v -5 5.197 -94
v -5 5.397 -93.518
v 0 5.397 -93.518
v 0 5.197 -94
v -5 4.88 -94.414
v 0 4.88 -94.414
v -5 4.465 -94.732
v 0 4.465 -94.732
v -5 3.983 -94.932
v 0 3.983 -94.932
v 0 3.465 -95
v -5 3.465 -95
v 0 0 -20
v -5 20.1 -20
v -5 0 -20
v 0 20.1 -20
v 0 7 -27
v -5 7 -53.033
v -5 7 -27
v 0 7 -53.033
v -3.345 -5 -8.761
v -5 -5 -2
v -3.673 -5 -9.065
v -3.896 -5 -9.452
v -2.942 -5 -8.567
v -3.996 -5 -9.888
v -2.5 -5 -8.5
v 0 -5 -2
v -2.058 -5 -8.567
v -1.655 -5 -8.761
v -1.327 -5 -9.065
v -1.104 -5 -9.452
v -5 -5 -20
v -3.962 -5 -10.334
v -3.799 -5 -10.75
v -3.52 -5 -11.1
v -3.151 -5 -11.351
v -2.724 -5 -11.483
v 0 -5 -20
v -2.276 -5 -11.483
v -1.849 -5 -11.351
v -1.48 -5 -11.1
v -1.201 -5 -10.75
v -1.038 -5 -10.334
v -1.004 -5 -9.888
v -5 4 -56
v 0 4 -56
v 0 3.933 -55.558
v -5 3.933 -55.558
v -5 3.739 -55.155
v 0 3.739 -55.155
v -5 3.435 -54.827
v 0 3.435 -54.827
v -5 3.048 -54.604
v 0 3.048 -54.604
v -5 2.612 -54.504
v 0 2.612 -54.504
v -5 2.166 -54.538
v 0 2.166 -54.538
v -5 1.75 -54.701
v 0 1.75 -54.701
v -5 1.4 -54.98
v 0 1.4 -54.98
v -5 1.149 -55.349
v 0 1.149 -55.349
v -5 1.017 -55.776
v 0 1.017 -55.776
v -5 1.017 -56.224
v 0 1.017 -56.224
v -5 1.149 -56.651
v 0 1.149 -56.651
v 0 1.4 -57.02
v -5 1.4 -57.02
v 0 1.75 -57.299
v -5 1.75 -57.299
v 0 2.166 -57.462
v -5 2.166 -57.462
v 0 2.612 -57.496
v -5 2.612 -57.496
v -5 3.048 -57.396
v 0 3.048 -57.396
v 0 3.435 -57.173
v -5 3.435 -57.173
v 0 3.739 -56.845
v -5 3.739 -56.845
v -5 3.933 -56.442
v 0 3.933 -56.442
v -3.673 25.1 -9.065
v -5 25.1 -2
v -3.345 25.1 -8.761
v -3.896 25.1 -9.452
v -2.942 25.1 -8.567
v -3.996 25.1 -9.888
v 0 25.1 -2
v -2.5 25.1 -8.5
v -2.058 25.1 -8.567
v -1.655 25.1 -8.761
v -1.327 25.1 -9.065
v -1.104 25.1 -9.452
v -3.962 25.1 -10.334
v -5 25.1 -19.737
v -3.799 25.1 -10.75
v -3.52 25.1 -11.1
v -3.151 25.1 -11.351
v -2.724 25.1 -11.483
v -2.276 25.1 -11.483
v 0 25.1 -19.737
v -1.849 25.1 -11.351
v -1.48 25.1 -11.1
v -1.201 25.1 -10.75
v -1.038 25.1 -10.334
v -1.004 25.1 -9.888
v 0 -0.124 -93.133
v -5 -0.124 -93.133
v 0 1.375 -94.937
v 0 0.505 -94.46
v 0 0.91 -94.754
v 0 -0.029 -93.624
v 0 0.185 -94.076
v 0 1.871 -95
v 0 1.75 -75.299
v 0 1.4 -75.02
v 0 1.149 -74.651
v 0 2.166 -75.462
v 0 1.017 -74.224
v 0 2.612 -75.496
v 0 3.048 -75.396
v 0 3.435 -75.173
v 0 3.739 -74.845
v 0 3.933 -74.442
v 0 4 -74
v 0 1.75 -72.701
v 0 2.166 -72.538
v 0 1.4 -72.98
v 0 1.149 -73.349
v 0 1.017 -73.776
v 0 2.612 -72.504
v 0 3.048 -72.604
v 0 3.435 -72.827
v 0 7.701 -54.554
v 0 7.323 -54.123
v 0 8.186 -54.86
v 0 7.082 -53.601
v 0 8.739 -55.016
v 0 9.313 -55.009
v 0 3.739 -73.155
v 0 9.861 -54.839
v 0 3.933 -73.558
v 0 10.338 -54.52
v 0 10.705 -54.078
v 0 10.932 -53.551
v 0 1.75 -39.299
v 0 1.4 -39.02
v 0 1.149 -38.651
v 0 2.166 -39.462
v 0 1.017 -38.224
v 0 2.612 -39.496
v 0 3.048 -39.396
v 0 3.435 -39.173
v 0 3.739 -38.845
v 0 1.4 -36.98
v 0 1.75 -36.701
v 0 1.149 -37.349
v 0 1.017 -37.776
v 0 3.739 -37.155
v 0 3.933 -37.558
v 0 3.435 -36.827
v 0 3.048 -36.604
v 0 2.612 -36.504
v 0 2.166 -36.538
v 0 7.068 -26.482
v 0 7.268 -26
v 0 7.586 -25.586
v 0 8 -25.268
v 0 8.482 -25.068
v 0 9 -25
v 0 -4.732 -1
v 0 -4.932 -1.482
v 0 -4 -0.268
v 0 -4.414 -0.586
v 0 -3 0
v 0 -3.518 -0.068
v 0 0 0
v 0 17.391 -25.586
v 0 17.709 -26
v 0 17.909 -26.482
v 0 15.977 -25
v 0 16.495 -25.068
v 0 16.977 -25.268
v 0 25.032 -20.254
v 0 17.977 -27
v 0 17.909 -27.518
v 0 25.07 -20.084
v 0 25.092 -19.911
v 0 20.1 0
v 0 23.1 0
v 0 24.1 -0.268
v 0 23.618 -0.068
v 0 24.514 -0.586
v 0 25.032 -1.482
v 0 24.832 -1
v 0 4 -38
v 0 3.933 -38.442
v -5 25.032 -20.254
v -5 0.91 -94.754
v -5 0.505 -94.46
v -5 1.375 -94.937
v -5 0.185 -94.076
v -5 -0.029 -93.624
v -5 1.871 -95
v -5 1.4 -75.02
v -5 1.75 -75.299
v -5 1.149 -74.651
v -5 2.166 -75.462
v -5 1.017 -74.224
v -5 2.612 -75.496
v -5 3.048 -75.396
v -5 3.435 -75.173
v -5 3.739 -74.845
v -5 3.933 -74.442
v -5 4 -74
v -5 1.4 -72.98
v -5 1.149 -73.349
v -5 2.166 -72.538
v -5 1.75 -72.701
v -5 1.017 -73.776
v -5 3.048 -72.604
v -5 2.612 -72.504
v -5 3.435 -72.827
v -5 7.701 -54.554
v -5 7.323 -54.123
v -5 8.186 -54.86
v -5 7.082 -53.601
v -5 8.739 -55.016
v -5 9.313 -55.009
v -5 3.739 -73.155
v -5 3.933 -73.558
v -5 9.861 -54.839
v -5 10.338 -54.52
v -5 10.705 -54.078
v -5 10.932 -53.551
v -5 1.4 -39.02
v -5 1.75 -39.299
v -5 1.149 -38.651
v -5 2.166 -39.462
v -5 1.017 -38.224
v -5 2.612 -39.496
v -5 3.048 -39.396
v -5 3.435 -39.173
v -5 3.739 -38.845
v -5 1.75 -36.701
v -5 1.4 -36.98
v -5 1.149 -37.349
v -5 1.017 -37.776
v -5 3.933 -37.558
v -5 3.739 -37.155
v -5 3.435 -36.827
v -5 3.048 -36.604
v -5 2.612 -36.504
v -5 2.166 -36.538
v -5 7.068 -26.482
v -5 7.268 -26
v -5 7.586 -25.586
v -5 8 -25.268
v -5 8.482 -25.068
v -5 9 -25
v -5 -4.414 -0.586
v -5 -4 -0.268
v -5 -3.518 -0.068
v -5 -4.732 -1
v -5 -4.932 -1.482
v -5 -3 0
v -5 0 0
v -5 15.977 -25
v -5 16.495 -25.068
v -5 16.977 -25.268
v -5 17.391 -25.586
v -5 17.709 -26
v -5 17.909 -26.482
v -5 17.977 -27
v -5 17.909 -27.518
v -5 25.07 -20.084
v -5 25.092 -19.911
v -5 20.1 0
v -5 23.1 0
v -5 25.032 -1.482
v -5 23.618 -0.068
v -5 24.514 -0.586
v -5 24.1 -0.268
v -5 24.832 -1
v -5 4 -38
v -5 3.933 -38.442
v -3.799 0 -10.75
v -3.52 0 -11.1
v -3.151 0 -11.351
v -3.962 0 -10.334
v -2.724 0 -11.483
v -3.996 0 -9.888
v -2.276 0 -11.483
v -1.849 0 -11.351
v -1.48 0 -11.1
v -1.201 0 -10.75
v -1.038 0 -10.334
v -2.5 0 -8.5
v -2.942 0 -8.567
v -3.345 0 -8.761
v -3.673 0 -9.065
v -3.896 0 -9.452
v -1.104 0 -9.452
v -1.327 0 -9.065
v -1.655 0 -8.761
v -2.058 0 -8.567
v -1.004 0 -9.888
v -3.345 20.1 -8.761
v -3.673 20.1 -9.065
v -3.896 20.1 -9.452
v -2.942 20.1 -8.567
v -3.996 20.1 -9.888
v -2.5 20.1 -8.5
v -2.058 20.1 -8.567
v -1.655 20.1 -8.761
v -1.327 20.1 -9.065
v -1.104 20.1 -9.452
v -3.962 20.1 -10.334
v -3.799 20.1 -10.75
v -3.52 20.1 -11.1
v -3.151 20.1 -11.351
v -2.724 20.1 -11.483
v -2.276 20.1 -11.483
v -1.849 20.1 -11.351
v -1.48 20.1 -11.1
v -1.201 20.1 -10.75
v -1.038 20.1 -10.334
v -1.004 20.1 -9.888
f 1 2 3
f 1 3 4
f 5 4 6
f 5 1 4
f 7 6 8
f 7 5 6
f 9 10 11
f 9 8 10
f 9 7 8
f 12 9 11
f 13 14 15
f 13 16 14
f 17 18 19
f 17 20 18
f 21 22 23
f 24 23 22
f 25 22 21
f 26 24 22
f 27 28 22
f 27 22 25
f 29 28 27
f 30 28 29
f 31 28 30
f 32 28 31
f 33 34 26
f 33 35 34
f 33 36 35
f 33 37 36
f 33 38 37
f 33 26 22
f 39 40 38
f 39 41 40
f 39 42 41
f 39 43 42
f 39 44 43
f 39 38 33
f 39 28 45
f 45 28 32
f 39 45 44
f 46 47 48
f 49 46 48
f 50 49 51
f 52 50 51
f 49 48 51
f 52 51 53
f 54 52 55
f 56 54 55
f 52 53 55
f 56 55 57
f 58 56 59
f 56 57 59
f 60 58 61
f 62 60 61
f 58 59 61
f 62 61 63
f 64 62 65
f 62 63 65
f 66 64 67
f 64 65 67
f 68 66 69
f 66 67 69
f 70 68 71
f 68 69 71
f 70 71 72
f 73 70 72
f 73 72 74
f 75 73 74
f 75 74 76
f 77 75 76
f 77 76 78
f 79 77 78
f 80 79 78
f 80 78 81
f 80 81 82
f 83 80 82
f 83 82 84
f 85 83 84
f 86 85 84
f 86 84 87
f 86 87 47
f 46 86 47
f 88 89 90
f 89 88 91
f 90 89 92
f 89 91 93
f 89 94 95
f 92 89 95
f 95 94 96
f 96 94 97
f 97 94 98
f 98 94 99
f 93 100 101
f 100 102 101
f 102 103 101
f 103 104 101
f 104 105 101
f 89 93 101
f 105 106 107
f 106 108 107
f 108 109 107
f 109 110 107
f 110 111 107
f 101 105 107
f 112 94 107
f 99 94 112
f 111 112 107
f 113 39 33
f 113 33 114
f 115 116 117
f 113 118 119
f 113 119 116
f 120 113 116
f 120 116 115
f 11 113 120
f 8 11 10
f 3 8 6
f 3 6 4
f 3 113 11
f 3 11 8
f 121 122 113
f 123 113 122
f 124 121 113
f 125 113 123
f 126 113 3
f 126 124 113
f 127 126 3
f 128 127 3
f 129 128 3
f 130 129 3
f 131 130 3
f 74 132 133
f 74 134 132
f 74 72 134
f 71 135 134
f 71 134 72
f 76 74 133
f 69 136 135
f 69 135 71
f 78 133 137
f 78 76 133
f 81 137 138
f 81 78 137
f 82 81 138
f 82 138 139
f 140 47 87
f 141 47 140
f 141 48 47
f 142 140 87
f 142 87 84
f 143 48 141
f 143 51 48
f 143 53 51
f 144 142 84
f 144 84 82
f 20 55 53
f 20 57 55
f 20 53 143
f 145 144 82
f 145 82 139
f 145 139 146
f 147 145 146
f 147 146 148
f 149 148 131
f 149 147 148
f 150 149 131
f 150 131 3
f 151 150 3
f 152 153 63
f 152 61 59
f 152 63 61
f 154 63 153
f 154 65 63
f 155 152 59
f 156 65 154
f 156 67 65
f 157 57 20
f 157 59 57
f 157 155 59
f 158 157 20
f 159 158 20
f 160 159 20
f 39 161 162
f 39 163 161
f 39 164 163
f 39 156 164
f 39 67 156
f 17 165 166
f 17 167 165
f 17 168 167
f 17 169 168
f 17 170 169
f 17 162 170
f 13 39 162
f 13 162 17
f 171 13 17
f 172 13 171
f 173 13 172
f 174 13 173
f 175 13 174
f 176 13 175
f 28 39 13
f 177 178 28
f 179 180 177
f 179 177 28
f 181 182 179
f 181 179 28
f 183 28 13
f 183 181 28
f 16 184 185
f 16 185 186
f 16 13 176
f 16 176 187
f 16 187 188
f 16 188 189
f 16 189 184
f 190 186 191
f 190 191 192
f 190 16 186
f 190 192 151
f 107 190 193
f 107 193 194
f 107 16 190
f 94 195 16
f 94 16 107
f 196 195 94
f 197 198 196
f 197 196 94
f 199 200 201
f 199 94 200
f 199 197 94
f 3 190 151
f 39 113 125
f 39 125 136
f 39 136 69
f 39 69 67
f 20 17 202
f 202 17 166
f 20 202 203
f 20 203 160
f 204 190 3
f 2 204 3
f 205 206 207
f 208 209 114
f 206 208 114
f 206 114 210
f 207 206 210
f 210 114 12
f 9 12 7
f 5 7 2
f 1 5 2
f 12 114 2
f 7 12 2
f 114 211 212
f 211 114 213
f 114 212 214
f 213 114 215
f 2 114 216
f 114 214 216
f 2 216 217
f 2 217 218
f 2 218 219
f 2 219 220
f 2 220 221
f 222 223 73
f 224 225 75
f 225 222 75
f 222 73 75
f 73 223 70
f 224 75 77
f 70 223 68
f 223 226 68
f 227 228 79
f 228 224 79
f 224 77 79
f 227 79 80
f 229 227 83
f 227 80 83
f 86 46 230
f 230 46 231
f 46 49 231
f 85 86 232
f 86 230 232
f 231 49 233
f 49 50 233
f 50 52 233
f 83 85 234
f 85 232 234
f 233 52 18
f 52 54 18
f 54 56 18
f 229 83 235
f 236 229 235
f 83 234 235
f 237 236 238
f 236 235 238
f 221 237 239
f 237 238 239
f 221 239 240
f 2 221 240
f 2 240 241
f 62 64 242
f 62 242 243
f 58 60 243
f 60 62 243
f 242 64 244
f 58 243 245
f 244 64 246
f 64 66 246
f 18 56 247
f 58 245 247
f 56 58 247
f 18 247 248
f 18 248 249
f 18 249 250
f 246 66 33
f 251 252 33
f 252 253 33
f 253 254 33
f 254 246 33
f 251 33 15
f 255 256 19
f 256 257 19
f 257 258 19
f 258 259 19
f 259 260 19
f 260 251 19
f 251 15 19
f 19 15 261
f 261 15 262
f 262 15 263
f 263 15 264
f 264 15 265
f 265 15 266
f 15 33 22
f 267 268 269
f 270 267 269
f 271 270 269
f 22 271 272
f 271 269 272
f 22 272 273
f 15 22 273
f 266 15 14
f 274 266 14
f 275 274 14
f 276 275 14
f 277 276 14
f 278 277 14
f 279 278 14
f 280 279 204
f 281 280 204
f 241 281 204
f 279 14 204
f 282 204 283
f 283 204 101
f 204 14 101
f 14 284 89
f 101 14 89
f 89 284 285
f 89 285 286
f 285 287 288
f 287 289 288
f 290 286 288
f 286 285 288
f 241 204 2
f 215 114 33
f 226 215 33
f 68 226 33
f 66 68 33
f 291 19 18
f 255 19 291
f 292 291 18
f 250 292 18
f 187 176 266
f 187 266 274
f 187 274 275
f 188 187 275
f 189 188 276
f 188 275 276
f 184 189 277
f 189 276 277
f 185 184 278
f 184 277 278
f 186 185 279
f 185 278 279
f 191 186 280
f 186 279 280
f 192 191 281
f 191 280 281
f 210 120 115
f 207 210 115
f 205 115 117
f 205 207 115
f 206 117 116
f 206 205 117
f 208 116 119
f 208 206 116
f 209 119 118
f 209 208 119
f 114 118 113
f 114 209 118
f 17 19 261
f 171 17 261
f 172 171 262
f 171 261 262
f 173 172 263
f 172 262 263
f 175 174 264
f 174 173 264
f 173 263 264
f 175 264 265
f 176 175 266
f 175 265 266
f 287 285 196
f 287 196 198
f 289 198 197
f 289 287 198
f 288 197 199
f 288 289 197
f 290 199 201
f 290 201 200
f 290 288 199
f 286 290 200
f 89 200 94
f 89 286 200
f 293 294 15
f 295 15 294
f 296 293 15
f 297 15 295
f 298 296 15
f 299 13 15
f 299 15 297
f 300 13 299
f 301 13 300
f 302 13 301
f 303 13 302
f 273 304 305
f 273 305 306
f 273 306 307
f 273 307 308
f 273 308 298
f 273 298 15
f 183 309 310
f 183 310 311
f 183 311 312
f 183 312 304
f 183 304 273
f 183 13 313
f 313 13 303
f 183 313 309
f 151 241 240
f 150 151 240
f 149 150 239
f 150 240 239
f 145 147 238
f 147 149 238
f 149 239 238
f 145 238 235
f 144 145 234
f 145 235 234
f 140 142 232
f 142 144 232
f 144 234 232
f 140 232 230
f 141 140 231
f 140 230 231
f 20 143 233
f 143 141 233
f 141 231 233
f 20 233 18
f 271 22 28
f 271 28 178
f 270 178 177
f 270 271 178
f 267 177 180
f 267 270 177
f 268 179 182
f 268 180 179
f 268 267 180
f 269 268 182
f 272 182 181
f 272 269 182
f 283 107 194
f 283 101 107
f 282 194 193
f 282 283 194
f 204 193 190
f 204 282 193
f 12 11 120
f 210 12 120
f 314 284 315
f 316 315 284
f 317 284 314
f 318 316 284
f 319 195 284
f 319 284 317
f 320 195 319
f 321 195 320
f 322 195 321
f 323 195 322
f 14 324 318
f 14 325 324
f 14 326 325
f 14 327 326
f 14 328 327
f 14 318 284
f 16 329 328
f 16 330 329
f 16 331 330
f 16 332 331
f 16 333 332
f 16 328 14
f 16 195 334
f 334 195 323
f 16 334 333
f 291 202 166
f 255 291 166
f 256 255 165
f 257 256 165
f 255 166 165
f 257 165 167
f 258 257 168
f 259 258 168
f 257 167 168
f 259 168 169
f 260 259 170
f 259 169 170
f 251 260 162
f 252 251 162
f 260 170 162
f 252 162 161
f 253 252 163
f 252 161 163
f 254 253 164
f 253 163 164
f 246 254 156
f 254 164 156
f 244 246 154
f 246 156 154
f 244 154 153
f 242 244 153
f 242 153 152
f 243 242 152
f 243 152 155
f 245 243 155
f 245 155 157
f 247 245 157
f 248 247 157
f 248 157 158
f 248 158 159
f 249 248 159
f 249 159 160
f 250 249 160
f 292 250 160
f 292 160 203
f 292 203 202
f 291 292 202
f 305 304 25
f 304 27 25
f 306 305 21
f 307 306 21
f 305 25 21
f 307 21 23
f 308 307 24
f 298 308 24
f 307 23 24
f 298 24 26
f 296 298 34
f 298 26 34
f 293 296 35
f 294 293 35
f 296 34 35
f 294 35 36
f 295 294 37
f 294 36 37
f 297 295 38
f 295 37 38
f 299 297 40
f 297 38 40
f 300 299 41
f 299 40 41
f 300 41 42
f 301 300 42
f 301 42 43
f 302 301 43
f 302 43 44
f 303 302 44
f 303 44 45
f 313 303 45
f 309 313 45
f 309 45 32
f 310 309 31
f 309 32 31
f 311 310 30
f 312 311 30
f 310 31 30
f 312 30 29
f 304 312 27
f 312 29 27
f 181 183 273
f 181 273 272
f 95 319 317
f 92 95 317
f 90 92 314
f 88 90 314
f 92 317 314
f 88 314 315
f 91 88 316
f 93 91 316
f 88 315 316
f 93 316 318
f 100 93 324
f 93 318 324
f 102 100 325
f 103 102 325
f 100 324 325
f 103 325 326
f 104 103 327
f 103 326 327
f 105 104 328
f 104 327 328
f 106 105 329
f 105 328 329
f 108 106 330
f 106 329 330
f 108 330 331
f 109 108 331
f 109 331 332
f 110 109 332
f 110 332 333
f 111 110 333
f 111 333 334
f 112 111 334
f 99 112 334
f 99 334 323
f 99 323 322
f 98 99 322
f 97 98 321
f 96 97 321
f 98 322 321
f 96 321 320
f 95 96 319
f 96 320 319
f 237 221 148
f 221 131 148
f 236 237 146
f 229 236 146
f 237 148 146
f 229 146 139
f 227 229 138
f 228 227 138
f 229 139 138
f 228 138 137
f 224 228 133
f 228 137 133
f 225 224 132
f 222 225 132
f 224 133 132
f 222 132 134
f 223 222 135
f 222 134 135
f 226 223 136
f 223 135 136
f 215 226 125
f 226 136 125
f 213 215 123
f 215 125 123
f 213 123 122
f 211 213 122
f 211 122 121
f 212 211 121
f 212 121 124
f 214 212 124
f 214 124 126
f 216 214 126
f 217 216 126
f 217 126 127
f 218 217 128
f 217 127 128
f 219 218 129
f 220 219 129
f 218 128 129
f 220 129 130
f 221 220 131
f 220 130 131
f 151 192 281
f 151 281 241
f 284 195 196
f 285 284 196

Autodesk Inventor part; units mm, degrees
ref_plane "YZ Plane" through (0, 0, 0) normal (1, 0, 0) x (0, 1, 0)
ref_plane "XZ Plane" through (0, 0, 0) normal (0, 1, 0) x (-1, 0, 0)
ref_plane "XY Plane" through (0, 0, 0) normal (0, 0, 1) x (1, 0, 0)
sketch "スケッチ1" plane through (0, 0, 0) normal (1, 0, 0) x (0, 1, 0)
  line L0 (0, 0) -> (20.1, 0)
  line L1 (20.1, 0) -> (20.1, -20)
  line L2 (20.1, -20) -> (0, -20)
  line L3 (0, -20) -> (0, 0)
  line L4 (0, -20) -> (5, -20)
  line L5 (5, -20) -> (5, -95)
  line L6 (5, -95) -> (0, -95)
  line L7 (0, -95) -> (0, -20)
  circle A0 centre (2.5, -38) radius 1.5
  circle A1 centre (2.5, -56) radius 1.5
  circle A2 centre (2.5, -74) radius 1.5
  line L8 (20.1, 0) -> (25.1, 0)
  line L9 (25.1, 0) -> (25.1, -20)
  line L10 (25.1, -20) -> (20.1, -20)
  line L11 (20.1, -20) -> (20.1, 0)
  line L12 (0, 0) -> (-5, 0)
  line L13 (-5, 0) -> (-5, -20)
  line L14 (-5, -20) -> (0, -20)
  line L15 (0, -20) -> (0, 0)
  line L16 (25.1, -20) -> (5, -95)
  line L17 (-5, -20) -> (0, -95)
  line L18 (25.1, -25) -> (15.1, -25)
  line L19 (15.1, -25) -> (15.1, 0.1)
  line L20 (0, -25) -> (25.1, -25)
  line L21 (25.1, -25) -> (25.1, 0.1)
  line L22 (20.2704, -18.7057) -> (0.1704, -93.7057)
  line L23 (7, -95) -> (7, -18)
  line L24 (7, -18) -> (0, -18)
  line L25 (0, -35) -> (-35, -35)
  line L26 (-35, -35) -> (-35, -85)
  line L27 (-35, -85) -> (0, -85)
  line L28 (0, -85) -> (0, -35)
  line L29 (-35, -38) -> (-70, -38)
  line L30 (-70, -38) -> (-70, -82)
  line L31 (-70, -82) -> (-35, -82)
  line L32 (-35, -82) -> (-35, -38)
  line L33 (7.5, -95) -> (-2.5, -95)
  line L34 (-2.5, -95) -> (-2.5, -21)
  line L35 (-2.5, -21) -> (7.5, -21)
  line L36 (7.5, -21) -> (7.5, -95)
  line L37 (-2.5, -21) -> (-64, -21)
  line L38 (-64, -21) -> (-64, -31)
  line L39 (-64, -31) -> (-2.5, -31)
  line L40 (-2.5, -31) -> (-2.5, -21)
  point P0 (7, -25)
  point P1 (18.5836, -25)
  point P2 (7, -68.2222)
  dimension "d0" = 20.1
  dimension "d1" = 20
  dimension "d2" = 5
  dimension "d3" = 75
  dimension "d4" = 3
  dimension "d5" = 3
  dimension "d6" = 3
  dimension "d7" = 2.5
  dimension "d8" = 2.5
  dimension "d9" = 2.5
  dimension "d10" = 18
  dimension "d11" = 18
  dimension "d12" = 18
  dimension "d13" = 5
  dimension "d14" = 5
  dimension "d15" = 0
  dimension "d16" = 0
  dimension "d17" = 5
  dimension "d18" = 5
  dimension "d19" = 5
  dimension "d20" = 2
  dimension "d33" = 50
  dimension "d34" = 35
  dimension "d35" = 35
  dimension "d36" = 44
  dimension "d37" = 3
  dimension "d38" = 0
  dimension "d39" = 10
  dimension "d40" = 0
  dimension "d41" = 5
  dimension "d42" = 5
  dimension "d43" = 6
  dimension "d44" = 10
  dimension "d46" = 1
extrude "押し出し1" add sketch "スケッチ1" against normal blind 5 contours L3 L14 L13 L12 | L8 L9 L10 L1 | L19 L20 L36 L35 L23 L2 | L2 L22 L18 L19 | L2 L5 L35 L7 | L7 L35 L37 L17 L14 | L2 L10 L16 L18 L22 | L23 L35 L5 L2 | L35 L5 L20 L7 | L7 L25 L34 L35 | L37 L34 L39 L17 | L18 L16 L36 L22 | L35 L36 L20 L23 | L23 L20 L5 L35 | L20 L5 L6 L7 | L39 L34 L25 L17 | L36 L16 L23 L22 | L23 L22 L5 L20 | L7 L27 L17 L34 L25 | L25 L34 L17 | L23 L16 L5 L22 | L7 L17 L27
fillet "フィレット1" radius 2 9 edges at (-2.5, 7, -25) (-2.5, 18.5836, -25) (-2.5, 7, -68.2222) (-2.5, 25.1, 0) (-2.5, 25.1, -20) (-2.5, -5, 0) (-2.5, -5, -20) (-2.5, 0, -95) (-2.5, 5, -95)
sketch "スケッチ2" plane through (0, 25.1, 0) normal (0, 1, 0) x (1, 0, 0)
  line L0 (0, 0) -> (-5, 0) projected
  line L1 (-5, 2) -> (-5, 19.7366) projected
  point P0 (-2.5, 10)
  point P1 (-5, 20.1)
  dimension "d24" = 10
  dimension "d25" = 2.5
hole "穴1" at (-2.5, 25.1, -10) direction (0, -1, 0) diameter 3 end through all
equation "\"d8\" = d7"
equation "\"d9\" = d7"
equation "\"d11\" = d10"
equation "\"d12\" = d10"
properties part number "base_weel-v2-Plate-7" material "アルミニウム 6061"
